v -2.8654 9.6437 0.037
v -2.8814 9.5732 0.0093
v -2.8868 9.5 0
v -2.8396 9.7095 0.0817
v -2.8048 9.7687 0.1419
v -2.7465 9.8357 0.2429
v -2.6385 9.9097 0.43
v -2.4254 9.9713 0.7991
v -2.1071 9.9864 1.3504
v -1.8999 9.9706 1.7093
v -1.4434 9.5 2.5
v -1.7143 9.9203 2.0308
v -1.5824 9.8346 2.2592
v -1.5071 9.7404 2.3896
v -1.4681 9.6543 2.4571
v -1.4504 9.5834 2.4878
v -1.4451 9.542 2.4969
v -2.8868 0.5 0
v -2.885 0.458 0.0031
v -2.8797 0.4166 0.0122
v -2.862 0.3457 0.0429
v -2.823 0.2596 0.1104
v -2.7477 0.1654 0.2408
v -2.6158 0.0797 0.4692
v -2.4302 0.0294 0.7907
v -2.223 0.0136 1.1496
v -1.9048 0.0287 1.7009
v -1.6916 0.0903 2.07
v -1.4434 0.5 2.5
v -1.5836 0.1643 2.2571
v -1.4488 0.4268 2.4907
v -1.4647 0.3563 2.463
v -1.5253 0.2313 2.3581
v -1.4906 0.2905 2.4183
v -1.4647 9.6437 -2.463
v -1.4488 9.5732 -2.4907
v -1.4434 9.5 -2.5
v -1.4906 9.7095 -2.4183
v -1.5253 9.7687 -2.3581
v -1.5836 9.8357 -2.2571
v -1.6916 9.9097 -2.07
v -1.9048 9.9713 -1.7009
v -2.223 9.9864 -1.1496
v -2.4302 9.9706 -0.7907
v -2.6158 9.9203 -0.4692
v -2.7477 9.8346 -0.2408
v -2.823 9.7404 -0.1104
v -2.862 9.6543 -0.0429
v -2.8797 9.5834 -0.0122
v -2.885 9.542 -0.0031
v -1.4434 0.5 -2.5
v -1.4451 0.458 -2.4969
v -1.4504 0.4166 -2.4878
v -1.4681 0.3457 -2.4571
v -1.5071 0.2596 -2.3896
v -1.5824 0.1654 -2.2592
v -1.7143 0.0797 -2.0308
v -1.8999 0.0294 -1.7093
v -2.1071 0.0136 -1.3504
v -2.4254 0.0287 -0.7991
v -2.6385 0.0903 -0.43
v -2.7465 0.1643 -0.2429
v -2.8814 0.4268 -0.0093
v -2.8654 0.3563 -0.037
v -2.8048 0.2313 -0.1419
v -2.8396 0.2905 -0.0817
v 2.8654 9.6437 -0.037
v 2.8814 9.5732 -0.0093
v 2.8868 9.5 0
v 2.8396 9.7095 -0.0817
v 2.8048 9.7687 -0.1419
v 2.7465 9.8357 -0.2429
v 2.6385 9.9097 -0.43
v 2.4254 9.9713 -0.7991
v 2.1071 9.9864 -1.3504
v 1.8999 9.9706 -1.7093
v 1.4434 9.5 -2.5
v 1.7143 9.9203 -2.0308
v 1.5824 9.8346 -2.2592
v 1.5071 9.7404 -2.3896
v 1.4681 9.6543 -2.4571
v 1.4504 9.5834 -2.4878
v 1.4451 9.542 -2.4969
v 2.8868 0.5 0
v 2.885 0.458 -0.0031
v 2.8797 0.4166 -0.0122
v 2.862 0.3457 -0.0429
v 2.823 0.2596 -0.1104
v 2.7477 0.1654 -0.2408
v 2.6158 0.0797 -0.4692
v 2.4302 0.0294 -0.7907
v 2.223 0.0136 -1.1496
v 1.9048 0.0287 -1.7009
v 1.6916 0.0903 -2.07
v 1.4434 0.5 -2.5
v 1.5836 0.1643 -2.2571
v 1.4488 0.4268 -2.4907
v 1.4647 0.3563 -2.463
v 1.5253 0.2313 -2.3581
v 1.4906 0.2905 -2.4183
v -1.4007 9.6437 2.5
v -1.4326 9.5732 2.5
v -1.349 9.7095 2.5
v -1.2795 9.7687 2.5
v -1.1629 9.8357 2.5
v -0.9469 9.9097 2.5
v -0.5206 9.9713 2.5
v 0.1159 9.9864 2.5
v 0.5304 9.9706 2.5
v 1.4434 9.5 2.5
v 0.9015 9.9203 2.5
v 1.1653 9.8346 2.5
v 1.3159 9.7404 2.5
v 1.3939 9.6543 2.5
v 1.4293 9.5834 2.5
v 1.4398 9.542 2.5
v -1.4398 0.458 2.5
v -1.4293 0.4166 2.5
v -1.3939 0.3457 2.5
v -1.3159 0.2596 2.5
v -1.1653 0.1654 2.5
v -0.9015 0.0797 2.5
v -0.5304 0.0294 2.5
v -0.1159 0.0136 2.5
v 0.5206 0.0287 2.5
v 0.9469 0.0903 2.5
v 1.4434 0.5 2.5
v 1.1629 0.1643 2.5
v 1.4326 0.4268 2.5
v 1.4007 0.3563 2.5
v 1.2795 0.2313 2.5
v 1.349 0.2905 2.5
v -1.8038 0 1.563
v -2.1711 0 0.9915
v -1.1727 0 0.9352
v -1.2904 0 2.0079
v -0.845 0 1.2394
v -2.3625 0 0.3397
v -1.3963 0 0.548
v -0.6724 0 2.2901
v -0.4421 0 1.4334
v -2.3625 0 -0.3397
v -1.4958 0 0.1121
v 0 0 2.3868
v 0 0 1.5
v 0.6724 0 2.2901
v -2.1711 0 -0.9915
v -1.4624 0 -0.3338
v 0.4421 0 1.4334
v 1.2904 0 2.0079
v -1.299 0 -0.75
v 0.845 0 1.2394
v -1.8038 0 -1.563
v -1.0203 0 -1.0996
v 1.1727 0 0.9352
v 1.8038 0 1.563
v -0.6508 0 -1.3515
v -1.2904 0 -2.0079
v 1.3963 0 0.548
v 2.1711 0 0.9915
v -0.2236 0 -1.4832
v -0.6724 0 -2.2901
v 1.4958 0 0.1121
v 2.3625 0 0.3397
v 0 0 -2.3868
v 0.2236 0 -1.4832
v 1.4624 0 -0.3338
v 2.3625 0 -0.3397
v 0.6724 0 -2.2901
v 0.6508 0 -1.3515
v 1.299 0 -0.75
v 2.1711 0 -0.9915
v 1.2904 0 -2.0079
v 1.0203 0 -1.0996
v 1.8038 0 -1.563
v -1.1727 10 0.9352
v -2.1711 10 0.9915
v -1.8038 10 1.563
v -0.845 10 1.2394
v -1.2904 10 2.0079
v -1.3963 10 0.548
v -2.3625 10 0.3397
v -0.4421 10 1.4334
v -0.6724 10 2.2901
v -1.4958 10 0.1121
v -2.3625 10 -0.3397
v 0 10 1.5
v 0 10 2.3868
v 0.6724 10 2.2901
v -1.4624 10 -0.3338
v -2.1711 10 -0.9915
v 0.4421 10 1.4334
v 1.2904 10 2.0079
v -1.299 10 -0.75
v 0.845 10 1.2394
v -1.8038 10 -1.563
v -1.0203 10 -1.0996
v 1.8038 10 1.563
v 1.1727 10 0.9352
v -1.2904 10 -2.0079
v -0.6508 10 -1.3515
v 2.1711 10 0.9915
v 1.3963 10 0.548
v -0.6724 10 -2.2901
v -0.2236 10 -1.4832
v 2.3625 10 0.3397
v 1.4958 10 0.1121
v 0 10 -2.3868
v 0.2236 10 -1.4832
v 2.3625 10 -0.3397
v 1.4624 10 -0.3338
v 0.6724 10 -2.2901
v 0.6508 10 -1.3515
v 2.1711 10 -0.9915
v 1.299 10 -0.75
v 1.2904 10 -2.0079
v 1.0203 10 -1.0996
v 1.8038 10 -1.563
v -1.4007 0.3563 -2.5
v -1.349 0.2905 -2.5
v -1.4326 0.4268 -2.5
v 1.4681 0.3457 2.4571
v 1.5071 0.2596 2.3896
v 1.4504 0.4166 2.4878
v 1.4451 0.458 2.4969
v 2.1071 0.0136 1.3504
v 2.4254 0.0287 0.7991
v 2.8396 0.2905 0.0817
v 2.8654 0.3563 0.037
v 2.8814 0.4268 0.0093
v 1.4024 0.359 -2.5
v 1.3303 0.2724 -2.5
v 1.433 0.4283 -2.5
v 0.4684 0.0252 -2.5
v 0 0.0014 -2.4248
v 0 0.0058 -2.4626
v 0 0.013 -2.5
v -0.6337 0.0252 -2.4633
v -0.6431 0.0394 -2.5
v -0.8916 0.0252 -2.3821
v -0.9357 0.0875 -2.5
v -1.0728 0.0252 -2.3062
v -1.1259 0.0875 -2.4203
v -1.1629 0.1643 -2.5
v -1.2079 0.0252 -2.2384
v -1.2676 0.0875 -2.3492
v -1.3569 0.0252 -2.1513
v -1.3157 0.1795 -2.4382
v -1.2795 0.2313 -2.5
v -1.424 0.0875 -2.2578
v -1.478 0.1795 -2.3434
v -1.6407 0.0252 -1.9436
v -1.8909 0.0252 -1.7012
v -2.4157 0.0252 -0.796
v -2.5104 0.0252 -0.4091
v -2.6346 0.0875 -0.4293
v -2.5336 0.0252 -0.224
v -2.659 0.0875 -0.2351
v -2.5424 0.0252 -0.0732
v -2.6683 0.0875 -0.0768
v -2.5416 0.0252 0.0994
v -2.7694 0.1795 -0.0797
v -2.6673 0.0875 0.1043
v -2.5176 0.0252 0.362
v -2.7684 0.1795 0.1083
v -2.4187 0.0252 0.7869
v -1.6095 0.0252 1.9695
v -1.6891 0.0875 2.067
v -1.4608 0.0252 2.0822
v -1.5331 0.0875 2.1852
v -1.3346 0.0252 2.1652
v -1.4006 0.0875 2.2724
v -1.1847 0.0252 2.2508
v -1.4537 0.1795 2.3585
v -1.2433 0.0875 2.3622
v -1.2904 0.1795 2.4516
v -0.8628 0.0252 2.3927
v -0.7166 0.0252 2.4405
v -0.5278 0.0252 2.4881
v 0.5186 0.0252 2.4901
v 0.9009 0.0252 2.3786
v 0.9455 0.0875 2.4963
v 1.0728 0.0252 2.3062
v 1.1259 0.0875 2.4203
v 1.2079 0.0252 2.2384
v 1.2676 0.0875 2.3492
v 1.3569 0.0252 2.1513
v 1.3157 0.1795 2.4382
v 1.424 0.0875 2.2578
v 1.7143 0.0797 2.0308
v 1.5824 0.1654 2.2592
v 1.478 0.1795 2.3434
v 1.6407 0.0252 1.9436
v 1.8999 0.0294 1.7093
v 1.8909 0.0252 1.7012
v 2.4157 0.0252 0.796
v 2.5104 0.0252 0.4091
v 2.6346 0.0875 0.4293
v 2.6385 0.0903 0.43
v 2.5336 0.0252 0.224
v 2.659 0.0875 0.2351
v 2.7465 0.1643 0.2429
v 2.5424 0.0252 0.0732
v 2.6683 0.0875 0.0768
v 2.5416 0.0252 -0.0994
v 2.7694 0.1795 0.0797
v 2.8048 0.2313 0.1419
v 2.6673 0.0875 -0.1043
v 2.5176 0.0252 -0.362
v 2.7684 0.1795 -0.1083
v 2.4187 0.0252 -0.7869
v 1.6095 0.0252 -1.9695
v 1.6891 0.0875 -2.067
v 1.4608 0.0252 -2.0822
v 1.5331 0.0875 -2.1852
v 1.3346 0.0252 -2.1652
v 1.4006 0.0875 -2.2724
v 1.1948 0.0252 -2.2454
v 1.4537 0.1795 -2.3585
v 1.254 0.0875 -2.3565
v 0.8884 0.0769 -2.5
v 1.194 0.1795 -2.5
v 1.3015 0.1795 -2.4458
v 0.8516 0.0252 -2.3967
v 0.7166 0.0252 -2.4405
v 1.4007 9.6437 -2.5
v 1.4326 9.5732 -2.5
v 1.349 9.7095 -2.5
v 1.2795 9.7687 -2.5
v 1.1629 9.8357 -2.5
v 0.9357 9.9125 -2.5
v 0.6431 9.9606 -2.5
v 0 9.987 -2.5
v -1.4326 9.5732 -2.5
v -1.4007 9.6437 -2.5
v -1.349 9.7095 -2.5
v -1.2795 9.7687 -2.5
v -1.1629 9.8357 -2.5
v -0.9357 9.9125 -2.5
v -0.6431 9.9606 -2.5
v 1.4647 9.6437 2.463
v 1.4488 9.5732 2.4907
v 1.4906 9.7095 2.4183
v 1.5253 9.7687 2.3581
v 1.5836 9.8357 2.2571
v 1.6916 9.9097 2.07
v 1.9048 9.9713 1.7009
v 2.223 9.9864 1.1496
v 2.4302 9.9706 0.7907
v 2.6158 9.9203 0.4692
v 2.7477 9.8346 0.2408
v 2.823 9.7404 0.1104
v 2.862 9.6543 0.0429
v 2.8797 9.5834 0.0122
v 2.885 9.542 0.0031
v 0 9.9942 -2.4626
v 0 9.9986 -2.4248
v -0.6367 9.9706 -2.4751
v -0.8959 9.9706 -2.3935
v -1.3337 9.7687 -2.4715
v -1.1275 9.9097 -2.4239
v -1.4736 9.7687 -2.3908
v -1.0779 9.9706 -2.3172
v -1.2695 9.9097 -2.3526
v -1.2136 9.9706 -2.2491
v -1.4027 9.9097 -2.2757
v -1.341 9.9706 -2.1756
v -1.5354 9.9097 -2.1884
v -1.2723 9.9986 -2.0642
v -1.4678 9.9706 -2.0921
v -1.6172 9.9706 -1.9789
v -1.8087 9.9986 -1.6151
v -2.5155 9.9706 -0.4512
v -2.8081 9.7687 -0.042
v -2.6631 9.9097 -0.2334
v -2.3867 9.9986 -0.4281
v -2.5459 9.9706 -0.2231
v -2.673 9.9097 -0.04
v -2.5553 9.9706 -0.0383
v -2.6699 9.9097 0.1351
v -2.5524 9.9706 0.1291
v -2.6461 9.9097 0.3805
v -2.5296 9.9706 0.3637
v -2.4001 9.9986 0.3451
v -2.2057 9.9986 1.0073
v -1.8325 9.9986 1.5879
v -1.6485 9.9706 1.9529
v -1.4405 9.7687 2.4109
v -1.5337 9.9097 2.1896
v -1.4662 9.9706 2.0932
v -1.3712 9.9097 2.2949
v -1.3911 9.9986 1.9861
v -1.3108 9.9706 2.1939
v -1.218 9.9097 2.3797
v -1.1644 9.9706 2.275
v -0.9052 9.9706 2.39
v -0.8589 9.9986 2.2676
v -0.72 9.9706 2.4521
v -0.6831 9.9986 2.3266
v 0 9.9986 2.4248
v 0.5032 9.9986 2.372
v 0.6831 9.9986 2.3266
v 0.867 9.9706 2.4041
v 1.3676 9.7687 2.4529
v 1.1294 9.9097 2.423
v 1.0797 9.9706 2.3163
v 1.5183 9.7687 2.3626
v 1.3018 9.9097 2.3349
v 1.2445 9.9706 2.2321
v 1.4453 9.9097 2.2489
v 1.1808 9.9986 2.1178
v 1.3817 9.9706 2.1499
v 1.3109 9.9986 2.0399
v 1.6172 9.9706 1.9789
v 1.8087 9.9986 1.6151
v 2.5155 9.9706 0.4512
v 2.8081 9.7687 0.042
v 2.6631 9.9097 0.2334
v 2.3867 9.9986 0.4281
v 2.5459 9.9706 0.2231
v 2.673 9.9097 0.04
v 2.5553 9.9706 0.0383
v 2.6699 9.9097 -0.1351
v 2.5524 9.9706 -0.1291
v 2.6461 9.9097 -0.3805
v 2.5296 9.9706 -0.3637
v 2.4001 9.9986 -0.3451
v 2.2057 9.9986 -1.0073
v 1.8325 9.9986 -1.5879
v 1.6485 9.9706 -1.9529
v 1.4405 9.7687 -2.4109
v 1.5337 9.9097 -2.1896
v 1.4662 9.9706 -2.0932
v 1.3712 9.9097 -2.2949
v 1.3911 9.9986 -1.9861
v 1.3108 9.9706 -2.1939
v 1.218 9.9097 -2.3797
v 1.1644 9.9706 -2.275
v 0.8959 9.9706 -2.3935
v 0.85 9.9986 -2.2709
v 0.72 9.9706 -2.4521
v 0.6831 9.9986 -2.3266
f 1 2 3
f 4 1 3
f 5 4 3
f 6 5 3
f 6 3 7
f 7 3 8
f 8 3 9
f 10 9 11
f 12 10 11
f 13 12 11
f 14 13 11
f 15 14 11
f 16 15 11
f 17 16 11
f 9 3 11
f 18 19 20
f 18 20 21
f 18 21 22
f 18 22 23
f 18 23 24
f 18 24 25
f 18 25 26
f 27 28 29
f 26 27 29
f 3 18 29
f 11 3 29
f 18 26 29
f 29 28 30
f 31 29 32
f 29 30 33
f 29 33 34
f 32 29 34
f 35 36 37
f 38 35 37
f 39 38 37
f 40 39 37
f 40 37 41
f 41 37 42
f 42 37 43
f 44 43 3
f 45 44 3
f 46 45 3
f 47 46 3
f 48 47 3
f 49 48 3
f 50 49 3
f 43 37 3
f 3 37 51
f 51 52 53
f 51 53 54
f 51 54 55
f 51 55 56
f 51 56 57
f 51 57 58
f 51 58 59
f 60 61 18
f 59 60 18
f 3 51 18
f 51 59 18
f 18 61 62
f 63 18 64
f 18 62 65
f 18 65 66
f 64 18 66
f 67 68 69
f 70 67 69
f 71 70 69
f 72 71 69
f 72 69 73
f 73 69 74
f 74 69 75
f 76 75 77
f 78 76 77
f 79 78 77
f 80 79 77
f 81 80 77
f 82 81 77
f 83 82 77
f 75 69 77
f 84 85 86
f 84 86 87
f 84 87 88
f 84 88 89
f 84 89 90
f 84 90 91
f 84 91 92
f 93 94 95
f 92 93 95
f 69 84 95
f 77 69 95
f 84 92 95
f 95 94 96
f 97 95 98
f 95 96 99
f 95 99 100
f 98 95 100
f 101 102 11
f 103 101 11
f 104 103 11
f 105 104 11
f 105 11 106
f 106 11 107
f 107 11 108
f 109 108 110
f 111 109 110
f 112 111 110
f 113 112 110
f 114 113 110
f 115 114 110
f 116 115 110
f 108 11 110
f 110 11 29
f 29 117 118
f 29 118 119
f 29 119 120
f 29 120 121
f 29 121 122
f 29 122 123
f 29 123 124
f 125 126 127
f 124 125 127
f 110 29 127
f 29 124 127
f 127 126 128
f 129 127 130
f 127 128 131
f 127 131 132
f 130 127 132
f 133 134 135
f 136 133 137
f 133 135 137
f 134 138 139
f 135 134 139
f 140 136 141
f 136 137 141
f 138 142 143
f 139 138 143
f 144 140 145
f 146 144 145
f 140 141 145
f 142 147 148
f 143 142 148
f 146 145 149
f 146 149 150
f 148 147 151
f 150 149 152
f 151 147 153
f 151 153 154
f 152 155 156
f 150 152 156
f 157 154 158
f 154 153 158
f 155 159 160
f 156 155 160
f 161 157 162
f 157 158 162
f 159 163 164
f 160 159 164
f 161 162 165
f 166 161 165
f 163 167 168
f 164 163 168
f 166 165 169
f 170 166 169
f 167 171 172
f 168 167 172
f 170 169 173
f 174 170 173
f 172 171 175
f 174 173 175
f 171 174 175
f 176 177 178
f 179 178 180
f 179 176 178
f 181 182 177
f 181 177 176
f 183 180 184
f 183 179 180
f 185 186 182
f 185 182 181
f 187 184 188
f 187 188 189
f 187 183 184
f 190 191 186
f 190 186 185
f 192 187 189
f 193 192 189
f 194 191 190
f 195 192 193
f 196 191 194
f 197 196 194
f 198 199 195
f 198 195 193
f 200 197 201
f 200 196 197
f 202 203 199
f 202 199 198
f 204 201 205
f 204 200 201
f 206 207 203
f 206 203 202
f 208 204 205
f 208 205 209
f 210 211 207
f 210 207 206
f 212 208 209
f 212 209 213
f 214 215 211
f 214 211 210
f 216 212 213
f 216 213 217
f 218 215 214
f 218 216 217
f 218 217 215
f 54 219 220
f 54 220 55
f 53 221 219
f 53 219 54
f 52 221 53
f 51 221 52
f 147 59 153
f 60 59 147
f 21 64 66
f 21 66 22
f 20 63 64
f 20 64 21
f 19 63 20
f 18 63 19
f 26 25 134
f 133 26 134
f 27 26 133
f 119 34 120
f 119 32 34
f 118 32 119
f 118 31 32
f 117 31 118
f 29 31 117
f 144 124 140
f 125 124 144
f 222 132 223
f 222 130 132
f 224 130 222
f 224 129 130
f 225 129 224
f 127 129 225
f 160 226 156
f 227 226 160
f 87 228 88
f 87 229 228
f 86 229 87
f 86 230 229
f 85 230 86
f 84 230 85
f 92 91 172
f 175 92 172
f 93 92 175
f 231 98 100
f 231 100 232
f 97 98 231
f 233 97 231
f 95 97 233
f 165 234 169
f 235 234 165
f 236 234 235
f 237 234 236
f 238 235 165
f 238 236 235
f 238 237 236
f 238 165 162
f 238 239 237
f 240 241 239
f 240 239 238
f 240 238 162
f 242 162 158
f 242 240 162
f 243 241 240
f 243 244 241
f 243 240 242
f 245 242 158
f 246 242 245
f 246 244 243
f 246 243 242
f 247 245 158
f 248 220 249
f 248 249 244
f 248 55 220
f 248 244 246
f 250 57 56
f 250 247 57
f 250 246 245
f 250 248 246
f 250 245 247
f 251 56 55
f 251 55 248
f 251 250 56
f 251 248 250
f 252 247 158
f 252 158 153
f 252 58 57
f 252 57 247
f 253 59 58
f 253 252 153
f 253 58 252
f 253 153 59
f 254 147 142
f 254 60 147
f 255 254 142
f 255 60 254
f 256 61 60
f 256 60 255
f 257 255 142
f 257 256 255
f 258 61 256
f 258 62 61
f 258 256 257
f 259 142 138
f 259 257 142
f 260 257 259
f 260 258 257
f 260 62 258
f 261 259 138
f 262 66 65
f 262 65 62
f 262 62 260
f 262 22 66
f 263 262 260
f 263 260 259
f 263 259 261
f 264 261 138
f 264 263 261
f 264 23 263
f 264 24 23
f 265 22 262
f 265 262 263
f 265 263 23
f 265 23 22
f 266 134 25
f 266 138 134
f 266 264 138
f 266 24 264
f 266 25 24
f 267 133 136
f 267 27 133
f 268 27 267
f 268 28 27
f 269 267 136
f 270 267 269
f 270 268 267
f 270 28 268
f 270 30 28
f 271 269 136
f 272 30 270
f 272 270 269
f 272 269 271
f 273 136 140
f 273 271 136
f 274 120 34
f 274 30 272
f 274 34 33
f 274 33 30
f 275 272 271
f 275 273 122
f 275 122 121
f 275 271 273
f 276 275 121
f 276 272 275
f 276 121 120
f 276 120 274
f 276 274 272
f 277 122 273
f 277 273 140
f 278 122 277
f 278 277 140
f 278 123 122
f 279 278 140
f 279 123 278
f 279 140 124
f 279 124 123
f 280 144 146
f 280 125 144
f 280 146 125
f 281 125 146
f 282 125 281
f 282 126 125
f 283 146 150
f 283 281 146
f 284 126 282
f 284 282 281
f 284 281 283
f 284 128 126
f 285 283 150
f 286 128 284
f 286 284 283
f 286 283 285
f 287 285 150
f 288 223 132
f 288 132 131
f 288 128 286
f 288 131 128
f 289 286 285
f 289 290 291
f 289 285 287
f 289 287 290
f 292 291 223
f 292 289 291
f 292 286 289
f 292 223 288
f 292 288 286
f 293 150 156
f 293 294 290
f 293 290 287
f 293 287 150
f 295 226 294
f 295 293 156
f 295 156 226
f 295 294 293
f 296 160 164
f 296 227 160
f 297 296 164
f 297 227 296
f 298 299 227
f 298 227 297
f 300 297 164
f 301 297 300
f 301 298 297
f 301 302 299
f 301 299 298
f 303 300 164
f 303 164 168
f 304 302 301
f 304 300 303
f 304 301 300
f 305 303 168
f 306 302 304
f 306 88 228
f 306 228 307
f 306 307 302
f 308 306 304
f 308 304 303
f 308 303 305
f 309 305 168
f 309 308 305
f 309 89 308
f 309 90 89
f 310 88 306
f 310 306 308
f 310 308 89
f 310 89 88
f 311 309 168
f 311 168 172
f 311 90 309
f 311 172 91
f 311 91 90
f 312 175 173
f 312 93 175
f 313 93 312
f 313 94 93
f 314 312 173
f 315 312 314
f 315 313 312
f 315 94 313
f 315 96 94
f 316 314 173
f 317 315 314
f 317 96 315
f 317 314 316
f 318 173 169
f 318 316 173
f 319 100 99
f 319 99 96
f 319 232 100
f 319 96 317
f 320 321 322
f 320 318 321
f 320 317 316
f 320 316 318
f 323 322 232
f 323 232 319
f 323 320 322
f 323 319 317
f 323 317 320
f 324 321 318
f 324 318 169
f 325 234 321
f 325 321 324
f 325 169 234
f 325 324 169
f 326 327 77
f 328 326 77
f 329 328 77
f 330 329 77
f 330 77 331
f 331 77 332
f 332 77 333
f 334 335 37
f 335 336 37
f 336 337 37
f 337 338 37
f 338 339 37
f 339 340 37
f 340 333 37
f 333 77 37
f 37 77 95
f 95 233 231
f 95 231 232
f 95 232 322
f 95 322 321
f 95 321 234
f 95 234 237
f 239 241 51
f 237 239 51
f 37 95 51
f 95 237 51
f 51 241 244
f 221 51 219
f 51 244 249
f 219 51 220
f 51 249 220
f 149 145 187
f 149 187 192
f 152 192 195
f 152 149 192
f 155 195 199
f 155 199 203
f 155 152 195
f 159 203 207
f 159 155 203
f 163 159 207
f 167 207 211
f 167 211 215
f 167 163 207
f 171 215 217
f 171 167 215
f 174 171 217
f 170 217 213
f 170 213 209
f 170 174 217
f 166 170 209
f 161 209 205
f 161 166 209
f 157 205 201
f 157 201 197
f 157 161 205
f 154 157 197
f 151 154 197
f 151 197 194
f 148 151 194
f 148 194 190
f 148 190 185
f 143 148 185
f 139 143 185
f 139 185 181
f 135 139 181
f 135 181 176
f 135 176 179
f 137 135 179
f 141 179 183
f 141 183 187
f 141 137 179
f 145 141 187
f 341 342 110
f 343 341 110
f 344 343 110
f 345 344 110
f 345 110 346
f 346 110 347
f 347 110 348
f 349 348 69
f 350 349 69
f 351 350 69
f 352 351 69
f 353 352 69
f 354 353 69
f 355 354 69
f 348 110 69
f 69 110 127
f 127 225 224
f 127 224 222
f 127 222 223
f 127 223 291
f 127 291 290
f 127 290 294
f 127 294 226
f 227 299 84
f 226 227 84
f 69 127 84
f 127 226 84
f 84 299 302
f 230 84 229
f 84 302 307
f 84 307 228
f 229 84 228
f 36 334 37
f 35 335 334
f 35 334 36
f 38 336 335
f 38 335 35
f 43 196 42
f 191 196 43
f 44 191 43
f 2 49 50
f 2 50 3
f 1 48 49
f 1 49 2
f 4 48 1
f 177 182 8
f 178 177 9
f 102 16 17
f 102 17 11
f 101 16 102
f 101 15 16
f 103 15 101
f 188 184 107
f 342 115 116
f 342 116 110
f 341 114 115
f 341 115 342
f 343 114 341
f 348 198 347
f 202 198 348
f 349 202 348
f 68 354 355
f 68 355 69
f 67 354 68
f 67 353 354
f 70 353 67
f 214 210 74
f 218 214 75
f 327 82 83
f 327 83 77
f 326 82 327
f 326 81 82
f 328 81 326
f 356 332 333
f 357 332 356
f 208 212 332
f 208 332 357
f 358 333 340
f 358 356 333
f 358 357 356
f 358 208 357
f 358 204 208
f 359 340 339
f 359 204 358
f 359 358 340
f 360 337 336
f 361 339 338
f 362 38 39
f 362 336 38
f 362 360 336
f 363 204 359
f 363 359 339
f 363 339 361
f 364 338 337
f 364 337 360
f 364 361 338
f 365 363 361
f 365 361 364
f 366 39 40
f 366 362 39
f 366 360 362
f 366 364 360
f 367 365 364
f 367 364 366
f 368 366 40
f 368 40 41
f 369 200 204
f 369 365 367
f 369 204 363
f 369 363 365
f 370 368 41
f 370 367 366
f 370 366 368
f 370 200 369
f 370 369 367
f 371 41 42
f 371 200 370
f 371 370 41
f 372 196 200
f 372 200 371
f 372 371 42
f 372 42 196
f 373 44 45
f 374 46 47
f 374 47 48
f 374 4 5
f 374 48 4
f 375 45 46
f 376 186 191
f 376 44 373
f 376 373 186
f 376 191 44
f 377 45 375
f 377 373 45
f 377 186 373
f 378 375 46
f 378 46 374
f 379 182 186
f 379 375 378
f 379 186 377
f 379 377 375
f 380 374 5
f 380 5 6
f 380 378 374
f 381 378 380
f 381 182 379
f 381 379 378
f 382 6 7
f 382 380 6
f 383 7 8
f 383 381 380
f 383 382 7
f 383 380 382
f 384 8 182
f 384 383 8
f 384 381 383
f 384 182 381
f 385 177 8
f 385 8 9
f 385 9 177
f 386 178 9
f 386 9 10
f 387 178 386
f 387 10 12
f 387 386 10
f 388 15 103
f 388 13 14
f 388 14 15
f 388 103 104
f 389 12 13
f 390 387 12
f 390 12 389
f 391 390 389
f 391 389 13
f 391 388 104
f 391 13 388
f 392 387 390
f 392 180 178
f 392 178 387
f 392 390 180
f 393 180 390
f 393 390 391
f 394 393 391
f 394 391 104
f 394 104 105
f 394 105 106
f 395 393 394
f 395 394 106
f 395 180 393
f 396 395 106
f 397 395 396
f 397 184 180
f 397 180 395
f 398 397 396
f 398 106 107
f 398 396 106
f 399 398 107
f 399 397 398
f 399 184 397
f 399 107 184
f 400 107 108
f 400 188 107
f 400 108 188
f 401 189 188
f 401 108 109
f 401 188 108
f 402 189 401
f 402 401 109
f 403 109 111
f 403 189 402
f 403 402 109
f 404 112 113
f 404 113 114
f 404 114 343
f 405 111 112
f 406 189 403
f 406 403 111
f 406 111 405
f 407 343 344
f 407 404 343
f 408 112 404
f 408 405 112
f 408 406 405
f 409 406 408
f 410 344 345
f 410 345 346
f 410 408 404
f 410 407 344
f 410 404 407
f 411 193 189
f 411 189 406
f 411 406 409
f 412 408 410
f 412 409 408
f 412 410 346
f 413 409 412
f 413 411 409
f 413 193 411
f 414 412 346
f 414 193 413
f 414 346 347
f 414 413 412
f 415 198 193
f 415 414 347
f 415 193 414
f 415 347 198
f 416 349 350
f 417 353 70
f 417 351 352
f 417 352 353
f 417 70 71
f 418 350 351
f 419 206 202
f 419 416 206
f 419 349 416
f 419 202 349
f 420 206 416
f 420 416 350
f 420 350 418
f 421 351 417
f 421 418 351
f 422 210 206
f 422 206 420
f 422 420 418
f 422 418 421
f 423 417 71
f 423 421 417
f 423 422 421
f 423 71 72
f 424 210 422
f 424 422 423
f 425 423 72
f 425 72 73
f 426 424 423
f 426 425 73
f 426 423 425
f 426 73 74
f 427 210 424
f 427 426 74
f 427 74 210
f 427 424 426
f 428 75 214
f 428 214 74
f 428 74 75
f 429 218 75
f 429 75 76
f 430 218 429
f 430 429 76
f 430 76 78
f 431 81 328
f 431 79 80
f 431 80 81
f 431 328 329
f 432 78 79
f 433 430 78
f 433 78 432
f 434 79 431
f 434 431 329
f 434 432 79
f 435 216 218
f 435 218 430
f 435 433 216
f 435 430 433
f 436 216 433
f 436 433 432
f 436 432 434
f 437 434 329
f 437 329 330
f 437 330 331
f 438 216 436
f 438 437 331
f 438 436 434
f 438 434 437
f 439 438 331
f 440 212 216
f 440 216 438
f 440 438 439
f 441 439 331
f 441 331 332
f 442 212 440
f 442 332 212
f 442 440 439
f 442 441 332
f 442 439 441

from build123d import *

# Parameters (mm, degrees)
ESQUISSE1_R        = 1.5
BOSS_EXTRU_1_DEPTH = 10


with BuildPart() as part:
    # Esquisse1 → Boss.-Extru.1 (new body)
    with BuildSketch(Plane(origin=(0, 0, 0), x_dir=(1, 0, 0), z_dir=(0, 1, 0))):
        Polygon((2.886751346, 0), (1.443375673, 2.5), (-1.443375673, 2.5), (-2.886751346, 0), (-1.443375673, -2.5), (1.443375673, -2.5), align=None)
        with Locations(Location((0, 0, 0), (0, 0, 270))):
            Circle(ESQUISSE1_R, mode=Mode.SUBTRACT)
    extrude(amount=BOSS_EXTRU_1_DEPTH)

    # Esquisse3 → Enlèvement de matière-Révolution1 (revolve, cut)
    with BuildSketch(Plane.XY, mode=Mode.PRIVATE) as enl_vement_de_mati_re_r_volution1_sk:
        with BuildLine():
            Line((2.386751346, 10), (2.886751346, 10))
            Line((2.886751346, 10), (2.886751346, 9.5))
            ThreePointArc((2.886751346, 9.5), (2.740304737, 9.853553391), (2.386751346, 10))
        make_face()
        with BuildLine():
            Line((2.886751346, 0.5), (2.886751346, 0))
            Line((2.886751346, 0), (2.386751346, 0))
            ThreePointArc((2.386751346, 0), (2.740304737, 0.146446609), (2.886751346, 0.5))
        make_face()
    revolve(enl_vement_de_mati_re_r_volution1_sk.sketch.rotate(Axis((0, -0.5, 0), (0, 1, 0)), 90), axis=Axis((0, -0.5, 0), (0, 1, 0)), mode=Mode.SUBTRACT)


solid = part.part
